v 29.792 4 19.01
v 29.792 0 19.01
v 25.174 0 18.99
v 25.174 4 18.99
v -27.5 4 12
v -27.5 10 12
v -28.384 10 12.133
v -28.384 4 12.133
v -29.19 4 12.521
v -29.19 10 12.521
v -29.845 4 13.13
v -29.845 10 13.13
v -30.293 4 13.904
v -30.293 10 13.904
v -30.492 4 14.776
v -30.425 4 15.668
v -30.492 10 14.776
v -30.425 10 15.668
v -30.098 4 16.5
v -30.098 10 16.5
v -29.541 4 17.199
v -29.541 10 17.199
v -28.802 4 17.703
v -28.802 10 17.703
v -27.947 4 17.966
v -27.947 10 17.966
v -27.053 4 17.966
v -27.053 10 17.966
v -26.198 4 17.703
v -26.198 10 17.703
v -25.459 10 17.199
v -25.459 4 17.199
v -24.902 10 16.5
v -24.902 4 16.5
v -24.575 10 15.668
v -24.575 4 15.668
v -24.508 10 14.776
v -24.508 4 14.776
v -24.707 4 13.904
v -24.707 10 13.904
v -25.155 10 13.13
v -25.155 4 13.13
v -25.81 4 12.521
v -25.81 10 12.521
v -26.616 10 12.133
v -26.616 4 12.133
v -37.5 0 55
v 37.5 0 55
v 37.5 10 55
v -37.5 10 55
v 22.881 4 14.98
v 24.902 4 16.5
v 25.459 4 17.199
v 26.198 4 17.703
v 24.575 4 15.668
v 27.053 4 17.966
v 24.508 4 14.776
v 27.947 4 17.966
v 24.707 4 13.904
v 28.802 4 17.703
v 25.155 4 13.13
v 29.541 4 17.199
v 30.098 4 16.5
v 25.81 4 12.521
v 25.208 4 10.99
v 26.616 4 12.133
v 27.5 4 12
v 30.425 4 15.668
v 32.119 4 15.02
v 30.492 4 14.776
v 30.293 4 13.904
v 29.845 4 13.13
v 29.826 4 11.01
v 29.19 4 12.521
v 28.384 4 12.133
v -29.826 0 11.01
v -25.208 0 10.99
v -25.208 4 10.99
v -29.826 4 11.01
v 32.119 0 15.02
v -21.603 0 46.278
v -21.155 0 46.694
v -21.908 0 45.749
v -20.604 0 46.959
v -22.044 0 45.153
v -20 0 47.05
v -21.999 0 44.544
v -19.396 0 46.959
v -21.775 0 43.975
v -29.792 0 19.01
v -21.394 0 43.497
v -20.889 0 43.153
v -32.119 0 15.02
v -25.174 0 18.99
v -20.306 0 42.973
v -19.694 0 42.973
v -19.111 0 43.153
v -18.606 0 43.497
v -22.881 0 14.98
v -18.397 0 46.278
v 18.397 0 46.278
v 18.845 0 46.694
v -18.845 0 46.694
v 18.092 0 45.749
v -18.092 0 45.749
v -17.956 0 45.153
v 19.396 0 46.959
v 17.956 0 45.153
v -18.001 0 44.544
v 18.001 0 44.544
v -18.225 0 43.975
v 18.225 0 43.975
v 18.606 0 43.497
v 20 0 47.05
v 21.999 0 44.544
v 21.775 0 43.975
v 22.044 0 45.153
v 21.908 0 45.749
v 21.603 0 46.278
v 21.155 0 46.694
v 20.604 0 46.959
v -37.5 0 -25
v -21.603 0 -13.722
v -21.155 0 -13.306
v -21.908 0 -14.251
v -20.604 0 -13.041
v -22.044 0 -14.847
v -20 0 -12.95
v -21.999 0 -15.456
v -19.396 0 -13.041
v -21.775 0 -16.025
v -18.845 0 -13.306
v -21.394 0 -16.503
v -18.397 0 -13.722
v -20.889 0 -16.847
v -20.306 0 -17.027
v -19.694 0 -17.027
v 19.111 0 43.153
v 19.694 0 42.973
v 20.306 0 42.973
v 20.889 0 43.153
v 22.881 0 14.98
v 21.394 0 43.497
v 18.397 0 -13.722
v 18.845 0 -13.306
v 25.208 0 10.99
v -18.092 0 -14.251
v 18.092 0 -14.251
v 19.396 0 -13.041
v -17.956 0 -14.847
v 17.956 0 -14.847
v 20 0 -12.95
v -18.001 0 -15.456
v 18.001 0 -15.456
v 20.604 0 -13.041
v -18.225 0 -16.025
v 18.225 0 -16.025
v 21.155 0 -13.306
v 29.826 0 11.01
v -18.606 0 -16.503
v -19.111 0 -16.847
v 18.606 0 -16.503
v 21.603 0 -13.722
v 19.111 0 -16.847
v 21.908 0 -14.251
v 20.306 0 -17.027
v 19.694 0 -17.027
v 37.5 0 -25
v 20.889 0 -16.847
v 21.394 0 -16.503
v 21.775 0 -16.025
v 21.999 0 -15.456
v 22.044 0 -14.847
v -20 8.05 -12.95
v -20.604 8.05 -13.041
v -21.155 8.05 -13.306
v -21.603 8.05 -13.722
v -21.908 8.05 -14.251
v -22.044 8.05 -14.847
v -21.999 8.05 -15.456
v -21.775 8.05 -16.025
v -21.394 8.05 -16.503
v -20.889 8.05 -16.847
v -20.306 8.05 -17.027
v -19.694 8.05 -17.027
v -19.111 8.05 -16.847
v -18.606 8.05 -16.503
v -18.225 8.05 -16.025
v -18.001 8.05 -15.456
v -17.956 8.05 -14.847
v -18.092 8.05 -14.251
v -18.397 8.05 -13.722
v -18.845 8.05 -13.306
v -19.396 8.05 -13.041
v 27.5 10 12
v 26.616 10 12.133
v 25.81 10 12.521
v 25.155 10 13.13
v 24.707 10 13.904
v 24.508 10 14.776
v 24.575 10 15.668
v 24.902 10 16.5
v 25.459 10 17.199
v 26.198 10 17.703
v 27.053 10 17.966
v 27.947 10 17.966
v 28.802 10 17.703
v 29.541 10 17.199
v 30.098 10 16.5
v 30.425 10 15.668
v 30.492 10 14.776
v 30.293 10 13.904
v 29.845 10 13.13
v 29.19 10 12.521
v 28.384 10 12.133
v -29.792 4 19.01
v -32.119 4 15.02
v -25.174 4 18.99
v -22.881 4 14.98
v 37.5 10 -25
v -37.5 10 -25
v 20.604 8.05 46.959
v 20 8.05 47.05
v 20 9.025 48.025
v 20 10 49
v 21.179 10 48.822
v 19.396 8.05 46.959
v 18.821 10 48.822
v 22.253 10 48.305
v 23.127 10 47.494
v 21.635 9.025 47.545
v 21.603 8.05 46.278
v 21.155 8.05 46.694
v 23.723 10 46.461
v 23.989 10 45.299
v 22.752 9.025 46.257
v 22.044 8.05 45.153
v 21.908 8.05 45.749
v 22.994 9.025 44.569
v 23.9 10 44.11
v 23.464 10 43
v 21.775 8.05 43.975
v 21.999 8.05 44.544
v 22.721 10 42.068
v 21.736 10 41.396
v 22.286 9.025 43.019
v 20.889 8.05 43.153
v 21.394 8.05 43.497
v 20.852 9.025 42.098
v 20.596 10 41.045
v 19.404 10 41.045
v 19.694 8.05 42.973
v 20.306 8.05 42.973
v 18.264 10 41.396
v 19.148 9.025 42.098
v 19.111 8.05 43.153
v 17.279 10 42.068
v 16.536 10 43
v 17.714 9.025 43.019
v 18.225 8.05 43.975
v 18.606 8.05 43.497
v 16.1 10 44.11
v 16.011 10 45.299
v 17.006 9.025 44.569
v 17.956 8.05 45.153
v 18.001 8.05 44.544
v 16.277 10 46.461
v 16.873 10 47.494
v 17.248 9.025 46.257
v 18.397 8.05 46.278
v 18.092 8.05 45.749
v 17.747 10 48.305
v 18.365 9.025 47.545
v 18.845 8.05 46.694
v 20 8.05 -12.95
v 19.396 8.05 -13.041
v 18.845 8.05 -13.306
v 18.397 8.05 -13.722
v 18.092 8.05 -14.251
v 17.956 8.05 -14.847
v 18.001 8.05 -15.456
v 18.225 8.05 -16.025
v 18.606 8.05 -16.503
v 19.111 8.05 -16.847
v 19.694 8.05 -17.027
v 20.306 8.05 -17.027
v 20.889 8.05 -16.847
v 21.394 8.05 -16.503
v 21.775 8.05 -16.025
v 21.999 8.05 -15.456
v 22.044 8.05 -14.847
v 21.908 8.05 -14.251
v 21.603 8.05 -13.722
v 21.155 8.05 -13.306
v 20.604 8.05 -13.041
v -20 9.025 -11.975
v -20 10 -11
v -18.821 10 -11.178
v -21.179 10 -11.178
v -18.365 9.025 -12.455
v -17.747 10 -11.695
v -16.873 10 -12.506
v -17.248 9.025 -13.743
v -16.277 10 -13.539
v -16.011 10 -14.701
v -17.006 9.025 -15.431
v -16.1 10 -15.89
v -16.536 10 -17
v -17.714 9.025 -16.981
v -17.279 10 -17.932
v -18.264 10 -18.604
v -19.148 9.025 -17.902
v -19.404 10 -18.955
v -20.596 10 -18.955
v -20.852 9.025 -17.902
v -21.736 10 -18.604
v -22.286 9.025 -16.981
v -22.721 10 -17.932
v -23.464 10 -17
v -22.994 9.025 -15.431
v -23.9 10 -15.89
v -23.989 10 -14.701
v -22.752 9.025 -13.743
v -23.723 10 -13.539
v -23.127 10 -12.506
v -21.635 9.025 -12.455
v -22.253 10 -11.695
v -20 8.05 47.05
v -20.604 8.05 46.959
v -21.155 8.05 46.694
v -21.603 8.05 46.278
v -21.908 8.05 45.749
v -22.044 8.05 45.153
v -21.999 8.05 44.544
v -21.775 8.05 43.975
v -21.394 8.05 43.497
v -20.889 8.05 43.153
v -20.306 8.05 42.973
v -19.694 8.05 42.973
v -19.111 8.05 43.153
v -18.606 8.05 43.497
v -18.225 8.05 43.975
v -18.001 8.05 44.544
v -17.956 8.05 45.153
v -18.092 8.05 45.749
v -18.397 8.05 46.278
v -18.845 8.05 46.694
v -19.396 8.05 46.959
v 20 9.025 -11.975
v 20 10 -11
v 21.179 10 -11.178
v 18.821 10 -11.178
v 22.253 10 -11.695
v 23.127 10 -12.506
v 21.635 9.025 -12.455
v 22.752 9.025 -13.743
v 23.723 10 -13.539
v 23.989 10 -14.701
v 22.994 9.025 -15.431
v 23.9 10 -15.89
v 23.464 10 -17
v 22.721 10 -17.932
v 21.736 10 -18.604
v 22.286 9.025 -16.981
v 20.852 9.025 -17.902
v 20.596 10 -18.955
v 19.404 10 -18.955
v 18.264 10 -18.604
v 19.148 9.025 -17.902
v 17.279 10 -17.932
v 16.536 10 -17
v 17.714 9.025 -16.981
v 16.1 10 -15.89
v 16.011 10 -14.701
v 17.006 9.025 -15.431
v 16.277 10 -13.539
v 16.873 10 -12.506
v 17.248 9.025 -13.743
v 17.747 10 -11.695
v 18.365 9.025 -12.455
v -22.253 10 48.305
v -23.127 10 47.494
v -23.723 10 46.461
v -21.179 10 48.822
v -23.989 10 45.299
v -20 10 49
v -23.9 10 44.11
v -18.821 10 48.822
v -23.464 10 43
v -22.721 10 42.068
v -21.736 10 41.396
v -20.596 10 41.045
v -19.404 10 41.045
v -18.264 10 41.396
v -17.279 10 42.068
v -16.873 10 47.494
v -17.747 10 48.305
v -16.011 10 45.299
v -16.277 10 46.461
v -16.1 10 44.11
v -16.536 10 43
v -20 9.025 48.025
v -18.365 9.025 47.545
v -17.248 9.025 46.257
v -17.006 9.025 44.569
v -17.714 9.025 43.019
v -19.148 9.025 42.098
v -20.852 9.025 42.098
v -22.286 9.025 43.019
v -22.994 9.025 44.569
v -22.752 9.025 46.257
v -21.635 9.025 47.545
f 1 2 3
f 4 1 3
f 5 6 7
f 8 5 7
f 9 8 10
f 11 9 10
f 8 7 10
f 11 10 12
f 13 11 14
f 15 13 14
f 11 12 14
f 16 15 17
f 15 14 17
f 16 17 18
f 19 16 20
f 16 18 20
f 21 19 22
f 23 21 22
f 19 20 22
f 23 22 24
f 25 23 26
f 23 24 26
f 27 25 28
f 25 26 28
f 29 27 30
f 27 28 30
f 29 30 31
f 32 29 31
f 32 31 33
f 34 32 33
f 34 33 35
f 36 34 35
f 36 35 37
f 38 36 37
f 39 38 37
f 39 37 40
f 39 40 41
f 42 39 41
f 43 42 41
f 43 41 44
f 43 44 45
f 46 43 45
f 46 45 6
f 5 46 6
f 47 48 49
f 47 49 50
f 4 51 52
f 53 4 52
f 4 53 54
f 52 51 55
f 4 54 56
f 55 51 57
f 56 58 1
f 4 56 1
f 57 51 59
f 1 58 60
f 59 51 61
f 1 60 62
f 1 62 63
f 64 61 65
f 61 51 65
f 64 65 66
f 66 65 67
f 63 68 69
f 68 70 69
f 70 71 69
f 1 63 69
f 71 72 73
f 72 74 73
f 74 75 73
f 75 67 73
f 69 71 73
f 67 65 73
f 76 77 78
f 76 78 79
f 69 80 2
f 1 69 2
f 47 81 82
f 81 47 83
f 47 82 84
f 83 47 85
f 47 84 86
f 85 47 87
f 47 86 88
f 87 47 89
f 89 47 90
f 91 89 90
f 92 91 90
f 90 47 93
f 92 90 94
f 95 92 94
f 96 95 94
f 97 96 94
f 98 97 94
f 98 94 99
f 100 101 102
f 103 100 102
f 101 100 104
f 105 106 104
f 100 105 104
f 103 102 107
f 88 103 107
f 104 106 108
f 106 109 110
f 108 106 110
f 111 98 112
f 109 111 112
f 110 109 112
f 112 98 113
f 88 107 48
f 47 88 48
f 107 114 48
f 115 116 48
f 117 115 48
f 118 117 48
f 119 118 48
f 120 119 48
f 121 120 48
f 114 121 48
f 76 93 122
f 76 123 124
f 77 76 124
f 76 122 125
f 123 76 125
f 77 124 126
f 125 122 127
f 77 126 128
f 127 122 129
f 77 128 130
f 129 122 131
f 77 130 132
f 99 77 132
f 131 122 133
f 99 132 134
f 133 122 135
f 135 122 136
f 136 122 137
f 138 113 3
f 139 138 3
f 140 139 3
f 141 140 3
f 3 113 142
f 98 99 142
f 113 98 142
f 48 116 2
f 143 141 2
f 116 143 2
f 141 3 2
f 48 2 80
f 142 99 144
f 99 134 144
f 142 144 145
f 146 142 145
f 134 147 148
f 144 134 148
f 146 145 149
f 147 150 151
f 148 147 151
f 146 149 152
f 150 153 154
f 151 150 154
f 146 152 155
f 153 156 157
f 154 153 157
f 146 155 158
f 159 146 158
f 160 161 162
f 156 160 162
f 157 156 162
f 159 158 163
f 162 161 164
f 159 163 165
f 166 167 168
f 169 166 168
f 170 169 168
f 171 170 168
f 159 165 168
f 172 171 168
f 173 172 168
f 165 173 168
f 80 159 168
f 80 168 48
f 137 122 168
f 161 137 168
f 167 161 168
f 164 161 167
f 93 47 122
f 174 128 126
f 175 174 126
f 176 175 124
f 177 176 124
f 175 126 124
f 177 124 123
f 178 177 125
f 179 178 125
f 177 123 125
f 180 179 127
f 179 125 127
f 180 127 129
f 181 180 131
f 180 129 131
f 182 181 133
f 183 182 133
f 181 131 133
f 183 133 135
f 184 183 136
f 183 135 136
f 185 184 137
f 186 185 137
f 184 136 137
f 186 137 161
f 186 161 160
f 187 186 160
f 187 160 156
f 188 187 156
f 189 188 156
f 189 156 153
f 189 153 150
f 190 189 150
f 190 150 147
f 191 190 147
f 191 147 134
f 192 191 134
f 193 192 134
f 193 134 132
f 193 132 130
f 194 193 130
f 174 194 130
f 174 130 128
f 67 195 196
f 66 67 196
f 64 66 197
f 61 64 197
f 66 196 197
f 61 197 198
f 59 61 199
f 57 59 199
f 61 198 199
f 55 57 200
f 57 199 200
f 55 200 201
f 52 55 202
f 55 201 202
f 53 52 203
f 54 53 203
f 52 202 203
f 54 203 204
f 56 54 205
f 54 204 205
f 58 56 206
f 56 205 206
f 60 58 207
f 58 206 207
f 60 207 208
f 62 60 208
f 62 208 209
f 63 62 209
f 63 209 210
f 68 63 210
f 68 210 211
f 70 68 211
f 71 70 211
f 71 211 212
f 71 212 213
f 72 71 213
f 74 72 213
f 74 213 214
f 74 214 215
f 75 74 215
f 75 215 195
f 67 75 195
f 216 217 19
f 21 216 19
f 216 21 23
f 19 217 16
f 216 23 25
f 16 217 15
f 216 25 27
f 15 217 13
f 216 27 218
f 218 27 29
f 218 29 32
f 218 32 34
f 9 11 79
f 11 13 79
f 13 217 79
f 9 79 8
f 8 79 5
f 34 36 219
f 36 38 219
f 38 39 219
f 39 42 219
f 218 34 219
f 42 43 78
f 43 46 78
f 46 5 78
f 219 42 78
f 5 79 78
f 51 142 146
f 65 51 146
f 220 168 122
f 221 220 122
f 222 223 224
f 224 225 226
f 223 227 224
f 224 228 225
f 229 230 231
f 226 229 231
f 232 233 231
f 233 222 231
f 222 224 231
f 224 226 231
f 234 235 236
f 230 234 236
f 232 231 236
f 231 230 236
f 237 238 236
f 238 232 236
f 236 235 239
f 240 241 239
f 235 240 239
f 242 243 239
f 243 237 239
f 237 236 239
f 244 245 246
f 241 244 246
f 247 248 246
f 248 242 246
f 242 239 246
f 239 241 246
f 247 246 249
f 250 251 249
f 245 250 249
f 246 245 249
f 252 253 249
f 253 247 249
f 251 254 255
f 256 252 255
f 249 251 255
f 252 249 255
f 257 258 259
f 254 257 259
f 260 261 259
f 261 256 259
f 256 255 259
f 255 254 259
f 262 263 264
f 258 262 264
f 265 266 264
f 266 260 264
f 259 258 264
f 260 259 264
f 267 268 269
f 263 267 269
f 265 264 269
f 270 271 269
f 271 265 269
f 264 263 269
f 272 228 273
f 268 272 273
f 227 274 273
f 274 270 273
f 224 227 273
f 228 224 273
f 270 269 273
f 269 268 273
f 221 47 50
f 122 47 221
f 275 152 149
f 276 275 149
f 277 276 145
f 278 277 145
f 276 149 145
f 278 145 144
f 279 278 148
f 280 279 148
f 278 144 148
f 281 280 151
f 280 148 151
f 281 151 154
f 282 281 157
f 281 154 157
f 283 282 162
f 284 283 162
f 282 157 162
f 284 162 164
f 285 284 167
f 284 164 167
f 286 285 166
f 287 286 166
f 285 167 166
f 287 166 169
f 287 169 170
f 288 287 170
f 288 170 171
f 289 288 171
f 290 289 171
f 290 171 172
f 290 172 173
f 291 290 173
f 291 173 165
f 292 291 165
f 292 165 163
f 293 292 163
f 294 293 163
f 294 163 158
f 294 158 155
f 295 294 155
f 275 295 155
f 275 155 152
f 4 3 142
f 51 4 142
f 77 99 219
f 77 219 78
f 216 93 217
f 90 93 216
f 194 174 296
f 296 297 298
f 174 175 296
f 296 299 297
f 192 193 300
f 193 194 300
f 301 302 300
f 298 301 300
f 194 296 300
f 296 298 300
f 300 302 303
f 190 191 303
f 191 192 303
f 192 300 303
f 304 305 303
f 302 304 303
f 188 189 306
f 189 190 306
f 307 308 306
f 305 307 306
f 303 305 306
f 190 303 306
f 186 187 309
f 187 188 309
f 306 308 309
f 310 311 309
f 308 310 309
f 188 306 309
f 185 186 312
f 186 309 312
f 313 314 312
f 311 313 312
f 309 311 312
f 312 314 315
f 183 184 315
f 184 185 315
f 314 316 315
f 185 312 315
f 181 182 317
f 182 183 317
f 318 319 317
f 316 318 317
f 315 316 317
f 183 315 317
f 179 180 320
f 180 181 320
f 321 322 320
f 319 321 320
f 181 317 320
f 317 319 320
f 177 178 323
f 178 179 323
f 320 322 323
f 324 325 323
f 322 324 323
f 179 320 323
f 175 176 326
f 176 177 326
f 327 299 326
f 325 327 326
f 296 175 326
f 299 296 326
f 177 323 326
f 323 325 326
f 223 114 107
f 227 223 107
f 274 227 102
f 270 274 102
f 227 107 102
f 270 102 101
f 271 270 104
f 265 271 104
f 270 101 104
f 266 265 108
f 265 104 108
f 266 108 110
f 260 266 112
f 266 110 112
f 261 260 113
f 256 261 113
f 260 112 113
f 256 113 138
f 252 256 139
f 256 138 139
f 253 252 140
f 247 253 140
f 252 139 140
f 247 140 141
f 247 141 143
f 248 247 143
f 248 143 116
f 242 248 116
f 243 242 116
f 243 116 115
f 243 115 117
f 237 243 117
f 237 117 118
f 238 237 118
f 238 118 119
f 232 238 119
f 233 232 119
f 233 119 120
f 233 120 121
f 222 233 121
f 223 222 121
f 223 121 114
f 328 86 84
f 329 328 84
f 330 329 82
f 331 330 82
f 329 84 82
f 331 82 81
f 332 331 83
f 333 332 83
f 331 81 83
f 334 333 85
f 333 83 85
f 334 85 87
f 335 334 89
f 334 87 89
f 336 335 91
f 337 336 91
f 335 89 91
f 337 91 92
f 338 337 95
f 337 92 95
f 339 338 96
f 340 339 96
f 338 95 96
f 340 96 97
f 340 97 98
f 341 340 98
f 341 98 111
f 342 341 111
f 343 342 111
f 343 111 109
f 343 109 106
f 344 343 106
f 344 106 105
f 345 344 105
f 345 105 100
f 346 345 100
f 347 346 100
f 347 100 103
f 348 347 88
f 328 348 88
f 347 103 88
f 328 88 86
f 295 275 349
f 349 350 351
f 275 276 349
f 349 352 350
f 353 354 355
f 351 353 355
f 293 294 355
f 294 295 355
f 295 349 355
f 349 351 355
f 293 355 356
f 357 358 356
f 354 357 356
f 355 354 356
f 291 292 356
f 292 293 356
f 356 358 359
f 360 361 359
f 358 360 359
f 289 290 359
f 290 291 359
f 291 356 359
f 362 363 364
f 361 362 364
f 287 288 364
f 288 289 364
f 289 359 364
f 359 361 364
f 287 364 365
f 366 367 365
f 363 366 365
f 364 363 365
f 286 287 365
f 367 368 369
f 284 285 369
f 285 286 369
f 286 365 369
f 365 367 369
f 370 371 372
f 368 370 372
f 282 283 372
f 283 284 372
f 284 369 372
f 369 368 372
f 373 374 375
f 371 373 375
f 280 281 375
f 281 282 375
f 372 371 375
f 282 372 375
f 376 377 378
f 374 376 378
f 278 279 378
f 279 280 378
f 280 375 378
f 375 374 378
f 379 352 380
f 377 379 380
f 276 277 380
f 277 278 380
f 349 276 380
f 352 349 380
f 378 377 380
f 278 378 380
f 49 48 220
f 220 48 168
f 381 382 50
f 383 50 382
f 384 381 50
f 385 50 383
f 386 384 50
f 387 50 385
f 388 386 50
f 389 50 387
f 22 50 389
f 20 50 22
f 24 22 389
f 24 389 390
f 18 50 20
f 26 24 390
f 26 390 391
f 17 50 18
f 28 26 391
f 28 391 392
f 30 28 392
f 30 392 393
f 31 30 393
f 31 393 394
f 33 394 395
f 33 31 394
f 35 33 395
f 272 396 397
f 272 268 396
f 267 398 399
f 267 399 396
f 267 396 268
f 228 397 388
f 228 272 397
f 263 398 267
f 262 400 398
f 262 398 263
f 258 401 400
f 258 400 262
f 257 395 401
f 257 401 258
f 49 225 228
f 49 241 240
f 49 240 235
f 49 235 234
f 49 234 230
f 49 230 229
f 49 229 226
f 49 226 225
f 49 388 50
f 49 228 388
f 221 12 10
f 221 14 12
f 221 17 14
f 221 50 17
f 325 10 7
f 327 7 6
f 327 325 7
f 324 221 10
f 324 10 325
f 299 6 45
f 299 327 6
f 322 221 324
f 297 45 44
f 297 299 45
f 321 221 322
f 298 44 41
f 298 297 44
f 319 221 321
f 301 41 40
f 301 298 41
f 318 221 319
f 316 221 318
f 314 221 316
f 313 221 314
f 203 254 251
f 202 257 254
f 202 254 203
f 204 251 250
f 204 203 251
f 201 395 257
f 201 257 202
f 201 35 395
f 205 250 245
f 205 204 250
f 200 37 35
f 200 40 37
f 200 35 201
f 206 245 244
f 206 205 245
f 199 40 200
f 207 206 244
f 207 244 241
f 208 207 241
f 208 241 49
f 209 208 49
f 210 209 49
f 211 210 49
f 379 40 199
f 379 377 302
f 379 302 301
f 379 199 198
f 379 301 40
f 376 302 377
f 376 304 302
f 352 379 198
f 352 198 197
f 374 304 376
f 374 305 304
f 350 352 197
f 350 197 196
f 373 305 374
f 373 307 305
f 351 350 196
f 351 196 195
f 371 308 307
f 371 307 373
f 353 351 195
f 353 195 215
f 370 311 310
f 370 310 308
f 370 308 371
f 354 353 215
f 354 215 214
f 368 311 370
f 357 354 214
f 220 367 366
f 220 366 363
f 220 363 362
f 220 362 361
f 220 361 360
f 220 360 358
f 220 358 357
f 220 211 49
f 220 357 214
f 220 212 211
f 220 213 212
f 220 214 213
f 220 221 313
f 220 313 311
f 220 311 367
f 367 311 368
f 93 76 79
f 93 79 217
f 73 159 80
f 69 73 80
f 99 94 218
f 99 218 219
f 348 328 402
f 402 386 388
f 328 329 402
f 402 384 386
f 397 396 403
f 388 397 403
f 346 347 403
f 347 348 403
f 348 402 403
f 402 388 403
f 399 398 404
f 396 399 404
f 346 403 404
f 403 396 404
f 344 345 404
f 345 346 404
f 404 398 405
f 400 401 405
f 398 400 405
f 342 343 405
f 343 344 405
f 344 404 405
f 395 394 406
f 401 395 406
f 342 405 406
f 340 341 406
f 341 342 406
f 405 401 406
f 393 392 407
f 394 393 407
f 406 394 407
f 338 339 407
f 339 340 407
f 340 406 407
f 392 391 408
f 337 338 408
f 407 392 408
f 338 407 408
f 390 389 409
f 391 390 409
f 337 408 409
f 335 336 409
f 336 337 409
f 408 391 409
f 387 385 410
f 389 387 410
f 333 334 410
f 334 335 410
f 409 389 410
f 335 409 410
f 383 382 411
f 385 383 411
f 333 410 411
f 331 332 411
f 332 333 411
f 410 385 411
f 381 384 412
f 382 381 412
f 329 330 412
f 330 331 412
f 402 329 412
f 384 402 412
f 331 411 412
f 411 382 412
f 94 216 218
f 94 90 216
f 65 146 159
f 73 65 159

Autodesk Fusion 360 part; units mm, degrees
sketch "Skizze1" plane through (0, 0, 0) normal (0, 1, 0) x (1, 0, 0)
  line L0 (0, 75) -> (0, -65)
  line L1 (0, -50) -> (0, 75)
  line L2 (-85, 0) -> (95, 0)
  line L3 (0, 0) -> (-37.5, 0)
  line L4 (-37.5, 0) -> (-37.5, -25)
  line L5 (-37.5, -25) -> (0, -25)
  line L6 (0, -25) -> (0, 0)
  line L7 (37.5, 0) -> (37.5, -25)
  line L8 (37.5, -25) -> (0, -25)
  line L9 (-37.5, 0) -> (-37.5, 25)
  line L10 (-37.5, 25) -> (0, 25)
  line L11 (37.5, 25) -> (0, 25)
  line L12 (37.5, 0) -> (37.5, 25)
  line L13 (-25.2075, -10.9903) -> (-29.8263, -11.0098)
  line L14 (-29.8263, -11.0098) -> (-32.1188, -15.0195)
  line L15 (-32.1188, -15.0195) -> (-29.7925, -19.0097)
  line L16 (-29.7925, -19.0097) -> (-25.1737, -18.9902)
  line L17 (-25.1737, -18.9902) -> (-22.8812, -14.9805)
  line L18 (-22.8812, -14.9805) -> (-25.2075, -10.9903)
  line L19 (22.8812, -14.9805) -> (25.2075, -10.9903)
  line L20 (25.2075, -10.9903) -> (29.8263, -11.0098)
  line L21 (29.8263, -11.0098) -> (32.1188, -15.0195)
  line L22 (32.1188, -15.0195) -> (29.7925, -19.0097)
  line L23 (29.7925, -19.0097) -> (25.1737, -18.9902)
  line L24 (25.1737, -18.9902) -> (22.8812, -14.9805)
  line L25 (-27.5, -15) -> (27.5, -15) construction
  line L26 (-37.5, -30) -> (-37.5, -55)
  line L27 (-37.5, -30) -> (-37.5, -5)
  line L28 (-37.5, -55) -> (0, -55)
  line L29 (37.5, -55) -> (0, -55)
  line L30 (37.5, -30) -> (37.5, -55)
  line L31 (37.5, -30) -> (37.5, -5)
  point P0 (-27.5, -15)
  point P1 (27.5, -15)
  point P2 (-27.5, -15)
  dimension "d1" = 37.5
  dimension "d2" = 25
  dimension "d7" = 10
  dimension "d8" = 55
  dimension "d9" = 4
extrude "Extrusion1" add sketch "Skizze1" along normal blind 10 contours L0 L1 L2 L11 L12 | L0 L1 L2 L3 L9 L10 | L0 L1 L2 L6 L7 L8 L31 | L0 L1 L2 L3 L4 L5 L6 L27 | L0 L1 L8 L29 L30 L31 | L0 L1 L5 L26 L27 L28 | L13 L14 L15 L16 L17 L18 | L19 L20 L21 L22 L23 L24
extrude "Extrusion2" cut sketch "Skizze1" along normal blind 4 contours L13 L14 L15 L16 L17 L18 | L19 L20 L21 L22 L23 L24
ref_plane "Arbeitsebene1" through (0, 10, 15) normal (0, 1, 0) x (0, 0, 1)
sketch "Skizze2" plane through (0, 10, 0) normal (0, 1, 0) x (1, 0, 0)
  line L0 (0, 75) -> (0, -65)
  line L1 (37.5, 25) -> (0, 25)
  line L2 (-27.5, -15) -> (27.5, -15)
  point P0 (-20, 15)
  point P1 (20, 15)
  point P2 (-20, -45)
  point P3 (20, -45)
  dimension "d15" = 40
  dimension "d16" = 10
hole "Bohrung1" at (-20, 10, -15) at (20, 10, -15) at (20, 10, 45) at (-20, 10, 45) direction (0, -1, 0) diameter 4.1 end through all countersink diameter 8 countersink angle 90
hole "Bohrung2" at (-27.5, 0, 15) direction (0, 1, 0) diameter 6 depth 12 tip angle 118
mirror "Spiegeln2" about plane through (0, 0, 0) normal (1, 0, 0) of "Bohrung2"
equation "d1 = ( 75 / 2 ) * 1 mm"
equation "d2 = ( 50 / 2 ) * 1 mm"
